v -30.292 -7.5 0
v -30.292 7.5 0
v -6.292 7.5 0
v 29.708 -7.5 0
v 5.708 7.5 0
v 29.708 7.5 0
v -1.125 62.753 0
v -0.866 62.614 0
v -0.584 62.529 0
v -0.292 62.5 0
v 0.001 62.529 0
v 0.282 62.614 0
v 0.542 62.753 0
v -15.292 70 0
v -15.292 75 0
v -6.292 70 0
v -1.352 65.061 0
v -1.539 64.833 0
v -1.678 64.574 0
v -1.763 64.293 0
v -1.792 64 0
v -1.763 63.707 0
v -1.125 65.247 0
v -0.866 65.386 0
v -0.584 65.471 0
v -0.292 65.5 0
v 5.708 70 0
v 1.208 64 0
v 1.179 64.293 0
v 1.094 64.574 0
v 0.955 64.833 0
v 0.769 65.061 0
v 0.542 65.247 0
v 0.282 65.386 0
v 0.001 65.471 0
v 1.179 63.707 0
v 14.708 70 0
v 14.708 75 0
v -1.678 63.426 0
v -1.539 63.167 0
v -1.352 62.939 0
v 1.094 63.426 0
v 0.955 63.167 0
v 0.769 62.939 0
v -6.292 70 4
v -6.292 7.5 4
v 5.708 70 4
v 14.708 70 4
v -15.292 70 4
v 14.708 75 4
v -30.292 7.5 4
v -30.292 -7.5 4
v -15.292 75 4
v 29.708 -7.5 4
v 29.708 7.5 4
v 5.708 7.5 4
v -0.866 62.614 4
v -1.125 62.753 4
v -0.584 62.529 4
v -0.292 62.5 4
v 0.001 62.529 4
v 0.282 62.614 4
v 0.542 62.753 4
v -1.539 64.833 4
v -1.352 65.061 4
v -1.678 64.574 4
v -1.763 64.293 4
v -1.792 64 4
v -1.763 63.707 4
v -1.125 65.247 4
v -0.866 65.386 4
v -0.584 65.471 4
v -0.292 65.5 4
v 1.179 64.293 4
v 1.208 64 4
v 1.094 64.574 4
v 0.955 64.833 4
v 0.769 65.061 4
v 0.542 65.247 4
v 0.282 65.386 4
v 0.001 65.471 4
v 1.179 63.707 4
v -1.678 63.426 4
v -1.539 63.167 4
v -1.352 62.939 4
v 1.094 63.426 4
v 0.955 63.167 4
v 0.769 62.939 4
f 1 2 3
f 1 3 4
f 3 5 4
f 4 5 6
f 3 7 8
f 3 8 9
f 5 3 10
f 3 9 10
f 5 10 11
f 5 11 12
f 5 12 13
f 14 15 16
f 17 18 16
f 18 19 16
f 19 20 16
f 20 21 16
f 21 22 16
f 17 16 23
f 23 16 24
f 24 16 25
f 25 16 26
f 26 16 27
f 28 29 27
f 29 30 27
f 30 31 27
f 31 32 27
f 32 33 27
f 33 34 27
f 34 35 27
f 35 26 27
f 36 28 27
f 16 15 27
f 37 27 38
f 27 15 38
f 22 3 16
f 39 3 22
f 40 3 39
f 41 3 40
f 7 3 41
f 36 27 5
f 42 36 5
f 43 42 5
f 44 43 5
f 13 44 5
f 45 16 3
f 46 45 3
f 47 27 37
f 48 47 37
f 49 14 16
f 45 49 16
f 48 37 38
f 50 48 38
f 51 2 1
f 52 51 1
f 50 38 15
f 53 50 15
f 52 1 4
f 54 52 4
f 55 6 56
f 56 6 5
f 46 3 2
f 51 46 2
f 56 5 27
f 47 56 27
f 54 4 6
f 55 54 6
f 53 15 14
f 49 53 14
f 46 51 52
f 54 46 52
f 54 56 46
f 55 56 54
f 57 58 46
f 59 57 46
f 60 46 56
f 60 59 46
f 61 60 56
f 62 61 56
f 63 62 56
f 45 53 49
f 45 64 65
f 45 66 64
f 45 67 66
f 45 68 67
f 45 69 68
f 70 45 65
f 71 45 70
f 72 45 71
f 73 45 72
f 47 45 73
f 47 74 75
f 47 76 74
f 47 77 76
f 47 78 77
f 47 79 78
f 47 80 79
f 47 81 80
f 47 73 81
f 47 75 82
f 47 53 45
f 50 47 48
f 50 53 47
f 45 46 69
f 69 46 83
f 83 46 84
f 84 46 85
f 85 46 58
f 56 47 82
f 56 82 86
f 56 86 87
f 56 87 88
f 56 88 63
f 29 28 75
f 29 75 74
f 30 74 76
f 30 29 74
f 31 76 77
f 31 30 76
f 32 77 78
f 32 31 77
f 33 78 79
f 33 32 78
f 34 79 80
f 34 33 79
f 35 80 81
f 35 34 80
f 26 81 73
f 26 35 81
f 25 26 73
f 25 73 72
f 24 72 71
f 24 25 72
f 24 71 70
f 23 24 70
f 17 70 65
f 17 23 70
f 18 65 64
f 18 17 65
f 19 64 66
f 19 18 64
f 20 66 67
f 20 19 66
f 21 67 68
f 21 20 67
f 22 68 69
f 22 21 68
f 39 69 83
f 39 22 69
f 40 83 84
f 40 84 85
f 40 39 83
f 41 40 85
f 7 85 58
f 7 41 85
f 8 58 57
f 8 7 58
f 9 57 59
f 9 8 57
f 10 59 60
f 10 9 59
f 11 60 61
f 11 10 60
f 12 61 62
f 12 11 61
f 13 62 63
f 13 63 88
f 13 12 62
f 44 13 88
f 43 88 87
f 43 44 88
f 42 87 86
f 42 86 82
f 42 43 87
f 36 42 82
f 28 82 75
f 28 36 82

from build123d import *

# Parameters (mm, degrees)
SKETCH_1_R      = 1.5
EXTRUDE_1_DEPTH = 4


with BuildPart() as part:
    # Эскиз1 → Бобышка-Вытянуть1 (new body)
    with BuildSketch(Plane.XY):
        Polygon((5.708165521, 70), (14.708165521, 70), (14.708165521, 75), (-15.291834479, 75), (-15.291834479, 70), (-6.291834479, 70), (-6.291834479, 7.5), (-30.291834479, 7.5), (-30.291834479, -7.5), (29.708165521, -7.5), (29.708165521, 7.5), (5.708165521, 7.5), align=None)
        with Locations((-0.291834479, 64)):
            Circle(SKETCH_1_R, mode=Mode.SUBTRACT)
    extrude(amount=EXTRUDE_1_DEPTH)


solid = part.part
